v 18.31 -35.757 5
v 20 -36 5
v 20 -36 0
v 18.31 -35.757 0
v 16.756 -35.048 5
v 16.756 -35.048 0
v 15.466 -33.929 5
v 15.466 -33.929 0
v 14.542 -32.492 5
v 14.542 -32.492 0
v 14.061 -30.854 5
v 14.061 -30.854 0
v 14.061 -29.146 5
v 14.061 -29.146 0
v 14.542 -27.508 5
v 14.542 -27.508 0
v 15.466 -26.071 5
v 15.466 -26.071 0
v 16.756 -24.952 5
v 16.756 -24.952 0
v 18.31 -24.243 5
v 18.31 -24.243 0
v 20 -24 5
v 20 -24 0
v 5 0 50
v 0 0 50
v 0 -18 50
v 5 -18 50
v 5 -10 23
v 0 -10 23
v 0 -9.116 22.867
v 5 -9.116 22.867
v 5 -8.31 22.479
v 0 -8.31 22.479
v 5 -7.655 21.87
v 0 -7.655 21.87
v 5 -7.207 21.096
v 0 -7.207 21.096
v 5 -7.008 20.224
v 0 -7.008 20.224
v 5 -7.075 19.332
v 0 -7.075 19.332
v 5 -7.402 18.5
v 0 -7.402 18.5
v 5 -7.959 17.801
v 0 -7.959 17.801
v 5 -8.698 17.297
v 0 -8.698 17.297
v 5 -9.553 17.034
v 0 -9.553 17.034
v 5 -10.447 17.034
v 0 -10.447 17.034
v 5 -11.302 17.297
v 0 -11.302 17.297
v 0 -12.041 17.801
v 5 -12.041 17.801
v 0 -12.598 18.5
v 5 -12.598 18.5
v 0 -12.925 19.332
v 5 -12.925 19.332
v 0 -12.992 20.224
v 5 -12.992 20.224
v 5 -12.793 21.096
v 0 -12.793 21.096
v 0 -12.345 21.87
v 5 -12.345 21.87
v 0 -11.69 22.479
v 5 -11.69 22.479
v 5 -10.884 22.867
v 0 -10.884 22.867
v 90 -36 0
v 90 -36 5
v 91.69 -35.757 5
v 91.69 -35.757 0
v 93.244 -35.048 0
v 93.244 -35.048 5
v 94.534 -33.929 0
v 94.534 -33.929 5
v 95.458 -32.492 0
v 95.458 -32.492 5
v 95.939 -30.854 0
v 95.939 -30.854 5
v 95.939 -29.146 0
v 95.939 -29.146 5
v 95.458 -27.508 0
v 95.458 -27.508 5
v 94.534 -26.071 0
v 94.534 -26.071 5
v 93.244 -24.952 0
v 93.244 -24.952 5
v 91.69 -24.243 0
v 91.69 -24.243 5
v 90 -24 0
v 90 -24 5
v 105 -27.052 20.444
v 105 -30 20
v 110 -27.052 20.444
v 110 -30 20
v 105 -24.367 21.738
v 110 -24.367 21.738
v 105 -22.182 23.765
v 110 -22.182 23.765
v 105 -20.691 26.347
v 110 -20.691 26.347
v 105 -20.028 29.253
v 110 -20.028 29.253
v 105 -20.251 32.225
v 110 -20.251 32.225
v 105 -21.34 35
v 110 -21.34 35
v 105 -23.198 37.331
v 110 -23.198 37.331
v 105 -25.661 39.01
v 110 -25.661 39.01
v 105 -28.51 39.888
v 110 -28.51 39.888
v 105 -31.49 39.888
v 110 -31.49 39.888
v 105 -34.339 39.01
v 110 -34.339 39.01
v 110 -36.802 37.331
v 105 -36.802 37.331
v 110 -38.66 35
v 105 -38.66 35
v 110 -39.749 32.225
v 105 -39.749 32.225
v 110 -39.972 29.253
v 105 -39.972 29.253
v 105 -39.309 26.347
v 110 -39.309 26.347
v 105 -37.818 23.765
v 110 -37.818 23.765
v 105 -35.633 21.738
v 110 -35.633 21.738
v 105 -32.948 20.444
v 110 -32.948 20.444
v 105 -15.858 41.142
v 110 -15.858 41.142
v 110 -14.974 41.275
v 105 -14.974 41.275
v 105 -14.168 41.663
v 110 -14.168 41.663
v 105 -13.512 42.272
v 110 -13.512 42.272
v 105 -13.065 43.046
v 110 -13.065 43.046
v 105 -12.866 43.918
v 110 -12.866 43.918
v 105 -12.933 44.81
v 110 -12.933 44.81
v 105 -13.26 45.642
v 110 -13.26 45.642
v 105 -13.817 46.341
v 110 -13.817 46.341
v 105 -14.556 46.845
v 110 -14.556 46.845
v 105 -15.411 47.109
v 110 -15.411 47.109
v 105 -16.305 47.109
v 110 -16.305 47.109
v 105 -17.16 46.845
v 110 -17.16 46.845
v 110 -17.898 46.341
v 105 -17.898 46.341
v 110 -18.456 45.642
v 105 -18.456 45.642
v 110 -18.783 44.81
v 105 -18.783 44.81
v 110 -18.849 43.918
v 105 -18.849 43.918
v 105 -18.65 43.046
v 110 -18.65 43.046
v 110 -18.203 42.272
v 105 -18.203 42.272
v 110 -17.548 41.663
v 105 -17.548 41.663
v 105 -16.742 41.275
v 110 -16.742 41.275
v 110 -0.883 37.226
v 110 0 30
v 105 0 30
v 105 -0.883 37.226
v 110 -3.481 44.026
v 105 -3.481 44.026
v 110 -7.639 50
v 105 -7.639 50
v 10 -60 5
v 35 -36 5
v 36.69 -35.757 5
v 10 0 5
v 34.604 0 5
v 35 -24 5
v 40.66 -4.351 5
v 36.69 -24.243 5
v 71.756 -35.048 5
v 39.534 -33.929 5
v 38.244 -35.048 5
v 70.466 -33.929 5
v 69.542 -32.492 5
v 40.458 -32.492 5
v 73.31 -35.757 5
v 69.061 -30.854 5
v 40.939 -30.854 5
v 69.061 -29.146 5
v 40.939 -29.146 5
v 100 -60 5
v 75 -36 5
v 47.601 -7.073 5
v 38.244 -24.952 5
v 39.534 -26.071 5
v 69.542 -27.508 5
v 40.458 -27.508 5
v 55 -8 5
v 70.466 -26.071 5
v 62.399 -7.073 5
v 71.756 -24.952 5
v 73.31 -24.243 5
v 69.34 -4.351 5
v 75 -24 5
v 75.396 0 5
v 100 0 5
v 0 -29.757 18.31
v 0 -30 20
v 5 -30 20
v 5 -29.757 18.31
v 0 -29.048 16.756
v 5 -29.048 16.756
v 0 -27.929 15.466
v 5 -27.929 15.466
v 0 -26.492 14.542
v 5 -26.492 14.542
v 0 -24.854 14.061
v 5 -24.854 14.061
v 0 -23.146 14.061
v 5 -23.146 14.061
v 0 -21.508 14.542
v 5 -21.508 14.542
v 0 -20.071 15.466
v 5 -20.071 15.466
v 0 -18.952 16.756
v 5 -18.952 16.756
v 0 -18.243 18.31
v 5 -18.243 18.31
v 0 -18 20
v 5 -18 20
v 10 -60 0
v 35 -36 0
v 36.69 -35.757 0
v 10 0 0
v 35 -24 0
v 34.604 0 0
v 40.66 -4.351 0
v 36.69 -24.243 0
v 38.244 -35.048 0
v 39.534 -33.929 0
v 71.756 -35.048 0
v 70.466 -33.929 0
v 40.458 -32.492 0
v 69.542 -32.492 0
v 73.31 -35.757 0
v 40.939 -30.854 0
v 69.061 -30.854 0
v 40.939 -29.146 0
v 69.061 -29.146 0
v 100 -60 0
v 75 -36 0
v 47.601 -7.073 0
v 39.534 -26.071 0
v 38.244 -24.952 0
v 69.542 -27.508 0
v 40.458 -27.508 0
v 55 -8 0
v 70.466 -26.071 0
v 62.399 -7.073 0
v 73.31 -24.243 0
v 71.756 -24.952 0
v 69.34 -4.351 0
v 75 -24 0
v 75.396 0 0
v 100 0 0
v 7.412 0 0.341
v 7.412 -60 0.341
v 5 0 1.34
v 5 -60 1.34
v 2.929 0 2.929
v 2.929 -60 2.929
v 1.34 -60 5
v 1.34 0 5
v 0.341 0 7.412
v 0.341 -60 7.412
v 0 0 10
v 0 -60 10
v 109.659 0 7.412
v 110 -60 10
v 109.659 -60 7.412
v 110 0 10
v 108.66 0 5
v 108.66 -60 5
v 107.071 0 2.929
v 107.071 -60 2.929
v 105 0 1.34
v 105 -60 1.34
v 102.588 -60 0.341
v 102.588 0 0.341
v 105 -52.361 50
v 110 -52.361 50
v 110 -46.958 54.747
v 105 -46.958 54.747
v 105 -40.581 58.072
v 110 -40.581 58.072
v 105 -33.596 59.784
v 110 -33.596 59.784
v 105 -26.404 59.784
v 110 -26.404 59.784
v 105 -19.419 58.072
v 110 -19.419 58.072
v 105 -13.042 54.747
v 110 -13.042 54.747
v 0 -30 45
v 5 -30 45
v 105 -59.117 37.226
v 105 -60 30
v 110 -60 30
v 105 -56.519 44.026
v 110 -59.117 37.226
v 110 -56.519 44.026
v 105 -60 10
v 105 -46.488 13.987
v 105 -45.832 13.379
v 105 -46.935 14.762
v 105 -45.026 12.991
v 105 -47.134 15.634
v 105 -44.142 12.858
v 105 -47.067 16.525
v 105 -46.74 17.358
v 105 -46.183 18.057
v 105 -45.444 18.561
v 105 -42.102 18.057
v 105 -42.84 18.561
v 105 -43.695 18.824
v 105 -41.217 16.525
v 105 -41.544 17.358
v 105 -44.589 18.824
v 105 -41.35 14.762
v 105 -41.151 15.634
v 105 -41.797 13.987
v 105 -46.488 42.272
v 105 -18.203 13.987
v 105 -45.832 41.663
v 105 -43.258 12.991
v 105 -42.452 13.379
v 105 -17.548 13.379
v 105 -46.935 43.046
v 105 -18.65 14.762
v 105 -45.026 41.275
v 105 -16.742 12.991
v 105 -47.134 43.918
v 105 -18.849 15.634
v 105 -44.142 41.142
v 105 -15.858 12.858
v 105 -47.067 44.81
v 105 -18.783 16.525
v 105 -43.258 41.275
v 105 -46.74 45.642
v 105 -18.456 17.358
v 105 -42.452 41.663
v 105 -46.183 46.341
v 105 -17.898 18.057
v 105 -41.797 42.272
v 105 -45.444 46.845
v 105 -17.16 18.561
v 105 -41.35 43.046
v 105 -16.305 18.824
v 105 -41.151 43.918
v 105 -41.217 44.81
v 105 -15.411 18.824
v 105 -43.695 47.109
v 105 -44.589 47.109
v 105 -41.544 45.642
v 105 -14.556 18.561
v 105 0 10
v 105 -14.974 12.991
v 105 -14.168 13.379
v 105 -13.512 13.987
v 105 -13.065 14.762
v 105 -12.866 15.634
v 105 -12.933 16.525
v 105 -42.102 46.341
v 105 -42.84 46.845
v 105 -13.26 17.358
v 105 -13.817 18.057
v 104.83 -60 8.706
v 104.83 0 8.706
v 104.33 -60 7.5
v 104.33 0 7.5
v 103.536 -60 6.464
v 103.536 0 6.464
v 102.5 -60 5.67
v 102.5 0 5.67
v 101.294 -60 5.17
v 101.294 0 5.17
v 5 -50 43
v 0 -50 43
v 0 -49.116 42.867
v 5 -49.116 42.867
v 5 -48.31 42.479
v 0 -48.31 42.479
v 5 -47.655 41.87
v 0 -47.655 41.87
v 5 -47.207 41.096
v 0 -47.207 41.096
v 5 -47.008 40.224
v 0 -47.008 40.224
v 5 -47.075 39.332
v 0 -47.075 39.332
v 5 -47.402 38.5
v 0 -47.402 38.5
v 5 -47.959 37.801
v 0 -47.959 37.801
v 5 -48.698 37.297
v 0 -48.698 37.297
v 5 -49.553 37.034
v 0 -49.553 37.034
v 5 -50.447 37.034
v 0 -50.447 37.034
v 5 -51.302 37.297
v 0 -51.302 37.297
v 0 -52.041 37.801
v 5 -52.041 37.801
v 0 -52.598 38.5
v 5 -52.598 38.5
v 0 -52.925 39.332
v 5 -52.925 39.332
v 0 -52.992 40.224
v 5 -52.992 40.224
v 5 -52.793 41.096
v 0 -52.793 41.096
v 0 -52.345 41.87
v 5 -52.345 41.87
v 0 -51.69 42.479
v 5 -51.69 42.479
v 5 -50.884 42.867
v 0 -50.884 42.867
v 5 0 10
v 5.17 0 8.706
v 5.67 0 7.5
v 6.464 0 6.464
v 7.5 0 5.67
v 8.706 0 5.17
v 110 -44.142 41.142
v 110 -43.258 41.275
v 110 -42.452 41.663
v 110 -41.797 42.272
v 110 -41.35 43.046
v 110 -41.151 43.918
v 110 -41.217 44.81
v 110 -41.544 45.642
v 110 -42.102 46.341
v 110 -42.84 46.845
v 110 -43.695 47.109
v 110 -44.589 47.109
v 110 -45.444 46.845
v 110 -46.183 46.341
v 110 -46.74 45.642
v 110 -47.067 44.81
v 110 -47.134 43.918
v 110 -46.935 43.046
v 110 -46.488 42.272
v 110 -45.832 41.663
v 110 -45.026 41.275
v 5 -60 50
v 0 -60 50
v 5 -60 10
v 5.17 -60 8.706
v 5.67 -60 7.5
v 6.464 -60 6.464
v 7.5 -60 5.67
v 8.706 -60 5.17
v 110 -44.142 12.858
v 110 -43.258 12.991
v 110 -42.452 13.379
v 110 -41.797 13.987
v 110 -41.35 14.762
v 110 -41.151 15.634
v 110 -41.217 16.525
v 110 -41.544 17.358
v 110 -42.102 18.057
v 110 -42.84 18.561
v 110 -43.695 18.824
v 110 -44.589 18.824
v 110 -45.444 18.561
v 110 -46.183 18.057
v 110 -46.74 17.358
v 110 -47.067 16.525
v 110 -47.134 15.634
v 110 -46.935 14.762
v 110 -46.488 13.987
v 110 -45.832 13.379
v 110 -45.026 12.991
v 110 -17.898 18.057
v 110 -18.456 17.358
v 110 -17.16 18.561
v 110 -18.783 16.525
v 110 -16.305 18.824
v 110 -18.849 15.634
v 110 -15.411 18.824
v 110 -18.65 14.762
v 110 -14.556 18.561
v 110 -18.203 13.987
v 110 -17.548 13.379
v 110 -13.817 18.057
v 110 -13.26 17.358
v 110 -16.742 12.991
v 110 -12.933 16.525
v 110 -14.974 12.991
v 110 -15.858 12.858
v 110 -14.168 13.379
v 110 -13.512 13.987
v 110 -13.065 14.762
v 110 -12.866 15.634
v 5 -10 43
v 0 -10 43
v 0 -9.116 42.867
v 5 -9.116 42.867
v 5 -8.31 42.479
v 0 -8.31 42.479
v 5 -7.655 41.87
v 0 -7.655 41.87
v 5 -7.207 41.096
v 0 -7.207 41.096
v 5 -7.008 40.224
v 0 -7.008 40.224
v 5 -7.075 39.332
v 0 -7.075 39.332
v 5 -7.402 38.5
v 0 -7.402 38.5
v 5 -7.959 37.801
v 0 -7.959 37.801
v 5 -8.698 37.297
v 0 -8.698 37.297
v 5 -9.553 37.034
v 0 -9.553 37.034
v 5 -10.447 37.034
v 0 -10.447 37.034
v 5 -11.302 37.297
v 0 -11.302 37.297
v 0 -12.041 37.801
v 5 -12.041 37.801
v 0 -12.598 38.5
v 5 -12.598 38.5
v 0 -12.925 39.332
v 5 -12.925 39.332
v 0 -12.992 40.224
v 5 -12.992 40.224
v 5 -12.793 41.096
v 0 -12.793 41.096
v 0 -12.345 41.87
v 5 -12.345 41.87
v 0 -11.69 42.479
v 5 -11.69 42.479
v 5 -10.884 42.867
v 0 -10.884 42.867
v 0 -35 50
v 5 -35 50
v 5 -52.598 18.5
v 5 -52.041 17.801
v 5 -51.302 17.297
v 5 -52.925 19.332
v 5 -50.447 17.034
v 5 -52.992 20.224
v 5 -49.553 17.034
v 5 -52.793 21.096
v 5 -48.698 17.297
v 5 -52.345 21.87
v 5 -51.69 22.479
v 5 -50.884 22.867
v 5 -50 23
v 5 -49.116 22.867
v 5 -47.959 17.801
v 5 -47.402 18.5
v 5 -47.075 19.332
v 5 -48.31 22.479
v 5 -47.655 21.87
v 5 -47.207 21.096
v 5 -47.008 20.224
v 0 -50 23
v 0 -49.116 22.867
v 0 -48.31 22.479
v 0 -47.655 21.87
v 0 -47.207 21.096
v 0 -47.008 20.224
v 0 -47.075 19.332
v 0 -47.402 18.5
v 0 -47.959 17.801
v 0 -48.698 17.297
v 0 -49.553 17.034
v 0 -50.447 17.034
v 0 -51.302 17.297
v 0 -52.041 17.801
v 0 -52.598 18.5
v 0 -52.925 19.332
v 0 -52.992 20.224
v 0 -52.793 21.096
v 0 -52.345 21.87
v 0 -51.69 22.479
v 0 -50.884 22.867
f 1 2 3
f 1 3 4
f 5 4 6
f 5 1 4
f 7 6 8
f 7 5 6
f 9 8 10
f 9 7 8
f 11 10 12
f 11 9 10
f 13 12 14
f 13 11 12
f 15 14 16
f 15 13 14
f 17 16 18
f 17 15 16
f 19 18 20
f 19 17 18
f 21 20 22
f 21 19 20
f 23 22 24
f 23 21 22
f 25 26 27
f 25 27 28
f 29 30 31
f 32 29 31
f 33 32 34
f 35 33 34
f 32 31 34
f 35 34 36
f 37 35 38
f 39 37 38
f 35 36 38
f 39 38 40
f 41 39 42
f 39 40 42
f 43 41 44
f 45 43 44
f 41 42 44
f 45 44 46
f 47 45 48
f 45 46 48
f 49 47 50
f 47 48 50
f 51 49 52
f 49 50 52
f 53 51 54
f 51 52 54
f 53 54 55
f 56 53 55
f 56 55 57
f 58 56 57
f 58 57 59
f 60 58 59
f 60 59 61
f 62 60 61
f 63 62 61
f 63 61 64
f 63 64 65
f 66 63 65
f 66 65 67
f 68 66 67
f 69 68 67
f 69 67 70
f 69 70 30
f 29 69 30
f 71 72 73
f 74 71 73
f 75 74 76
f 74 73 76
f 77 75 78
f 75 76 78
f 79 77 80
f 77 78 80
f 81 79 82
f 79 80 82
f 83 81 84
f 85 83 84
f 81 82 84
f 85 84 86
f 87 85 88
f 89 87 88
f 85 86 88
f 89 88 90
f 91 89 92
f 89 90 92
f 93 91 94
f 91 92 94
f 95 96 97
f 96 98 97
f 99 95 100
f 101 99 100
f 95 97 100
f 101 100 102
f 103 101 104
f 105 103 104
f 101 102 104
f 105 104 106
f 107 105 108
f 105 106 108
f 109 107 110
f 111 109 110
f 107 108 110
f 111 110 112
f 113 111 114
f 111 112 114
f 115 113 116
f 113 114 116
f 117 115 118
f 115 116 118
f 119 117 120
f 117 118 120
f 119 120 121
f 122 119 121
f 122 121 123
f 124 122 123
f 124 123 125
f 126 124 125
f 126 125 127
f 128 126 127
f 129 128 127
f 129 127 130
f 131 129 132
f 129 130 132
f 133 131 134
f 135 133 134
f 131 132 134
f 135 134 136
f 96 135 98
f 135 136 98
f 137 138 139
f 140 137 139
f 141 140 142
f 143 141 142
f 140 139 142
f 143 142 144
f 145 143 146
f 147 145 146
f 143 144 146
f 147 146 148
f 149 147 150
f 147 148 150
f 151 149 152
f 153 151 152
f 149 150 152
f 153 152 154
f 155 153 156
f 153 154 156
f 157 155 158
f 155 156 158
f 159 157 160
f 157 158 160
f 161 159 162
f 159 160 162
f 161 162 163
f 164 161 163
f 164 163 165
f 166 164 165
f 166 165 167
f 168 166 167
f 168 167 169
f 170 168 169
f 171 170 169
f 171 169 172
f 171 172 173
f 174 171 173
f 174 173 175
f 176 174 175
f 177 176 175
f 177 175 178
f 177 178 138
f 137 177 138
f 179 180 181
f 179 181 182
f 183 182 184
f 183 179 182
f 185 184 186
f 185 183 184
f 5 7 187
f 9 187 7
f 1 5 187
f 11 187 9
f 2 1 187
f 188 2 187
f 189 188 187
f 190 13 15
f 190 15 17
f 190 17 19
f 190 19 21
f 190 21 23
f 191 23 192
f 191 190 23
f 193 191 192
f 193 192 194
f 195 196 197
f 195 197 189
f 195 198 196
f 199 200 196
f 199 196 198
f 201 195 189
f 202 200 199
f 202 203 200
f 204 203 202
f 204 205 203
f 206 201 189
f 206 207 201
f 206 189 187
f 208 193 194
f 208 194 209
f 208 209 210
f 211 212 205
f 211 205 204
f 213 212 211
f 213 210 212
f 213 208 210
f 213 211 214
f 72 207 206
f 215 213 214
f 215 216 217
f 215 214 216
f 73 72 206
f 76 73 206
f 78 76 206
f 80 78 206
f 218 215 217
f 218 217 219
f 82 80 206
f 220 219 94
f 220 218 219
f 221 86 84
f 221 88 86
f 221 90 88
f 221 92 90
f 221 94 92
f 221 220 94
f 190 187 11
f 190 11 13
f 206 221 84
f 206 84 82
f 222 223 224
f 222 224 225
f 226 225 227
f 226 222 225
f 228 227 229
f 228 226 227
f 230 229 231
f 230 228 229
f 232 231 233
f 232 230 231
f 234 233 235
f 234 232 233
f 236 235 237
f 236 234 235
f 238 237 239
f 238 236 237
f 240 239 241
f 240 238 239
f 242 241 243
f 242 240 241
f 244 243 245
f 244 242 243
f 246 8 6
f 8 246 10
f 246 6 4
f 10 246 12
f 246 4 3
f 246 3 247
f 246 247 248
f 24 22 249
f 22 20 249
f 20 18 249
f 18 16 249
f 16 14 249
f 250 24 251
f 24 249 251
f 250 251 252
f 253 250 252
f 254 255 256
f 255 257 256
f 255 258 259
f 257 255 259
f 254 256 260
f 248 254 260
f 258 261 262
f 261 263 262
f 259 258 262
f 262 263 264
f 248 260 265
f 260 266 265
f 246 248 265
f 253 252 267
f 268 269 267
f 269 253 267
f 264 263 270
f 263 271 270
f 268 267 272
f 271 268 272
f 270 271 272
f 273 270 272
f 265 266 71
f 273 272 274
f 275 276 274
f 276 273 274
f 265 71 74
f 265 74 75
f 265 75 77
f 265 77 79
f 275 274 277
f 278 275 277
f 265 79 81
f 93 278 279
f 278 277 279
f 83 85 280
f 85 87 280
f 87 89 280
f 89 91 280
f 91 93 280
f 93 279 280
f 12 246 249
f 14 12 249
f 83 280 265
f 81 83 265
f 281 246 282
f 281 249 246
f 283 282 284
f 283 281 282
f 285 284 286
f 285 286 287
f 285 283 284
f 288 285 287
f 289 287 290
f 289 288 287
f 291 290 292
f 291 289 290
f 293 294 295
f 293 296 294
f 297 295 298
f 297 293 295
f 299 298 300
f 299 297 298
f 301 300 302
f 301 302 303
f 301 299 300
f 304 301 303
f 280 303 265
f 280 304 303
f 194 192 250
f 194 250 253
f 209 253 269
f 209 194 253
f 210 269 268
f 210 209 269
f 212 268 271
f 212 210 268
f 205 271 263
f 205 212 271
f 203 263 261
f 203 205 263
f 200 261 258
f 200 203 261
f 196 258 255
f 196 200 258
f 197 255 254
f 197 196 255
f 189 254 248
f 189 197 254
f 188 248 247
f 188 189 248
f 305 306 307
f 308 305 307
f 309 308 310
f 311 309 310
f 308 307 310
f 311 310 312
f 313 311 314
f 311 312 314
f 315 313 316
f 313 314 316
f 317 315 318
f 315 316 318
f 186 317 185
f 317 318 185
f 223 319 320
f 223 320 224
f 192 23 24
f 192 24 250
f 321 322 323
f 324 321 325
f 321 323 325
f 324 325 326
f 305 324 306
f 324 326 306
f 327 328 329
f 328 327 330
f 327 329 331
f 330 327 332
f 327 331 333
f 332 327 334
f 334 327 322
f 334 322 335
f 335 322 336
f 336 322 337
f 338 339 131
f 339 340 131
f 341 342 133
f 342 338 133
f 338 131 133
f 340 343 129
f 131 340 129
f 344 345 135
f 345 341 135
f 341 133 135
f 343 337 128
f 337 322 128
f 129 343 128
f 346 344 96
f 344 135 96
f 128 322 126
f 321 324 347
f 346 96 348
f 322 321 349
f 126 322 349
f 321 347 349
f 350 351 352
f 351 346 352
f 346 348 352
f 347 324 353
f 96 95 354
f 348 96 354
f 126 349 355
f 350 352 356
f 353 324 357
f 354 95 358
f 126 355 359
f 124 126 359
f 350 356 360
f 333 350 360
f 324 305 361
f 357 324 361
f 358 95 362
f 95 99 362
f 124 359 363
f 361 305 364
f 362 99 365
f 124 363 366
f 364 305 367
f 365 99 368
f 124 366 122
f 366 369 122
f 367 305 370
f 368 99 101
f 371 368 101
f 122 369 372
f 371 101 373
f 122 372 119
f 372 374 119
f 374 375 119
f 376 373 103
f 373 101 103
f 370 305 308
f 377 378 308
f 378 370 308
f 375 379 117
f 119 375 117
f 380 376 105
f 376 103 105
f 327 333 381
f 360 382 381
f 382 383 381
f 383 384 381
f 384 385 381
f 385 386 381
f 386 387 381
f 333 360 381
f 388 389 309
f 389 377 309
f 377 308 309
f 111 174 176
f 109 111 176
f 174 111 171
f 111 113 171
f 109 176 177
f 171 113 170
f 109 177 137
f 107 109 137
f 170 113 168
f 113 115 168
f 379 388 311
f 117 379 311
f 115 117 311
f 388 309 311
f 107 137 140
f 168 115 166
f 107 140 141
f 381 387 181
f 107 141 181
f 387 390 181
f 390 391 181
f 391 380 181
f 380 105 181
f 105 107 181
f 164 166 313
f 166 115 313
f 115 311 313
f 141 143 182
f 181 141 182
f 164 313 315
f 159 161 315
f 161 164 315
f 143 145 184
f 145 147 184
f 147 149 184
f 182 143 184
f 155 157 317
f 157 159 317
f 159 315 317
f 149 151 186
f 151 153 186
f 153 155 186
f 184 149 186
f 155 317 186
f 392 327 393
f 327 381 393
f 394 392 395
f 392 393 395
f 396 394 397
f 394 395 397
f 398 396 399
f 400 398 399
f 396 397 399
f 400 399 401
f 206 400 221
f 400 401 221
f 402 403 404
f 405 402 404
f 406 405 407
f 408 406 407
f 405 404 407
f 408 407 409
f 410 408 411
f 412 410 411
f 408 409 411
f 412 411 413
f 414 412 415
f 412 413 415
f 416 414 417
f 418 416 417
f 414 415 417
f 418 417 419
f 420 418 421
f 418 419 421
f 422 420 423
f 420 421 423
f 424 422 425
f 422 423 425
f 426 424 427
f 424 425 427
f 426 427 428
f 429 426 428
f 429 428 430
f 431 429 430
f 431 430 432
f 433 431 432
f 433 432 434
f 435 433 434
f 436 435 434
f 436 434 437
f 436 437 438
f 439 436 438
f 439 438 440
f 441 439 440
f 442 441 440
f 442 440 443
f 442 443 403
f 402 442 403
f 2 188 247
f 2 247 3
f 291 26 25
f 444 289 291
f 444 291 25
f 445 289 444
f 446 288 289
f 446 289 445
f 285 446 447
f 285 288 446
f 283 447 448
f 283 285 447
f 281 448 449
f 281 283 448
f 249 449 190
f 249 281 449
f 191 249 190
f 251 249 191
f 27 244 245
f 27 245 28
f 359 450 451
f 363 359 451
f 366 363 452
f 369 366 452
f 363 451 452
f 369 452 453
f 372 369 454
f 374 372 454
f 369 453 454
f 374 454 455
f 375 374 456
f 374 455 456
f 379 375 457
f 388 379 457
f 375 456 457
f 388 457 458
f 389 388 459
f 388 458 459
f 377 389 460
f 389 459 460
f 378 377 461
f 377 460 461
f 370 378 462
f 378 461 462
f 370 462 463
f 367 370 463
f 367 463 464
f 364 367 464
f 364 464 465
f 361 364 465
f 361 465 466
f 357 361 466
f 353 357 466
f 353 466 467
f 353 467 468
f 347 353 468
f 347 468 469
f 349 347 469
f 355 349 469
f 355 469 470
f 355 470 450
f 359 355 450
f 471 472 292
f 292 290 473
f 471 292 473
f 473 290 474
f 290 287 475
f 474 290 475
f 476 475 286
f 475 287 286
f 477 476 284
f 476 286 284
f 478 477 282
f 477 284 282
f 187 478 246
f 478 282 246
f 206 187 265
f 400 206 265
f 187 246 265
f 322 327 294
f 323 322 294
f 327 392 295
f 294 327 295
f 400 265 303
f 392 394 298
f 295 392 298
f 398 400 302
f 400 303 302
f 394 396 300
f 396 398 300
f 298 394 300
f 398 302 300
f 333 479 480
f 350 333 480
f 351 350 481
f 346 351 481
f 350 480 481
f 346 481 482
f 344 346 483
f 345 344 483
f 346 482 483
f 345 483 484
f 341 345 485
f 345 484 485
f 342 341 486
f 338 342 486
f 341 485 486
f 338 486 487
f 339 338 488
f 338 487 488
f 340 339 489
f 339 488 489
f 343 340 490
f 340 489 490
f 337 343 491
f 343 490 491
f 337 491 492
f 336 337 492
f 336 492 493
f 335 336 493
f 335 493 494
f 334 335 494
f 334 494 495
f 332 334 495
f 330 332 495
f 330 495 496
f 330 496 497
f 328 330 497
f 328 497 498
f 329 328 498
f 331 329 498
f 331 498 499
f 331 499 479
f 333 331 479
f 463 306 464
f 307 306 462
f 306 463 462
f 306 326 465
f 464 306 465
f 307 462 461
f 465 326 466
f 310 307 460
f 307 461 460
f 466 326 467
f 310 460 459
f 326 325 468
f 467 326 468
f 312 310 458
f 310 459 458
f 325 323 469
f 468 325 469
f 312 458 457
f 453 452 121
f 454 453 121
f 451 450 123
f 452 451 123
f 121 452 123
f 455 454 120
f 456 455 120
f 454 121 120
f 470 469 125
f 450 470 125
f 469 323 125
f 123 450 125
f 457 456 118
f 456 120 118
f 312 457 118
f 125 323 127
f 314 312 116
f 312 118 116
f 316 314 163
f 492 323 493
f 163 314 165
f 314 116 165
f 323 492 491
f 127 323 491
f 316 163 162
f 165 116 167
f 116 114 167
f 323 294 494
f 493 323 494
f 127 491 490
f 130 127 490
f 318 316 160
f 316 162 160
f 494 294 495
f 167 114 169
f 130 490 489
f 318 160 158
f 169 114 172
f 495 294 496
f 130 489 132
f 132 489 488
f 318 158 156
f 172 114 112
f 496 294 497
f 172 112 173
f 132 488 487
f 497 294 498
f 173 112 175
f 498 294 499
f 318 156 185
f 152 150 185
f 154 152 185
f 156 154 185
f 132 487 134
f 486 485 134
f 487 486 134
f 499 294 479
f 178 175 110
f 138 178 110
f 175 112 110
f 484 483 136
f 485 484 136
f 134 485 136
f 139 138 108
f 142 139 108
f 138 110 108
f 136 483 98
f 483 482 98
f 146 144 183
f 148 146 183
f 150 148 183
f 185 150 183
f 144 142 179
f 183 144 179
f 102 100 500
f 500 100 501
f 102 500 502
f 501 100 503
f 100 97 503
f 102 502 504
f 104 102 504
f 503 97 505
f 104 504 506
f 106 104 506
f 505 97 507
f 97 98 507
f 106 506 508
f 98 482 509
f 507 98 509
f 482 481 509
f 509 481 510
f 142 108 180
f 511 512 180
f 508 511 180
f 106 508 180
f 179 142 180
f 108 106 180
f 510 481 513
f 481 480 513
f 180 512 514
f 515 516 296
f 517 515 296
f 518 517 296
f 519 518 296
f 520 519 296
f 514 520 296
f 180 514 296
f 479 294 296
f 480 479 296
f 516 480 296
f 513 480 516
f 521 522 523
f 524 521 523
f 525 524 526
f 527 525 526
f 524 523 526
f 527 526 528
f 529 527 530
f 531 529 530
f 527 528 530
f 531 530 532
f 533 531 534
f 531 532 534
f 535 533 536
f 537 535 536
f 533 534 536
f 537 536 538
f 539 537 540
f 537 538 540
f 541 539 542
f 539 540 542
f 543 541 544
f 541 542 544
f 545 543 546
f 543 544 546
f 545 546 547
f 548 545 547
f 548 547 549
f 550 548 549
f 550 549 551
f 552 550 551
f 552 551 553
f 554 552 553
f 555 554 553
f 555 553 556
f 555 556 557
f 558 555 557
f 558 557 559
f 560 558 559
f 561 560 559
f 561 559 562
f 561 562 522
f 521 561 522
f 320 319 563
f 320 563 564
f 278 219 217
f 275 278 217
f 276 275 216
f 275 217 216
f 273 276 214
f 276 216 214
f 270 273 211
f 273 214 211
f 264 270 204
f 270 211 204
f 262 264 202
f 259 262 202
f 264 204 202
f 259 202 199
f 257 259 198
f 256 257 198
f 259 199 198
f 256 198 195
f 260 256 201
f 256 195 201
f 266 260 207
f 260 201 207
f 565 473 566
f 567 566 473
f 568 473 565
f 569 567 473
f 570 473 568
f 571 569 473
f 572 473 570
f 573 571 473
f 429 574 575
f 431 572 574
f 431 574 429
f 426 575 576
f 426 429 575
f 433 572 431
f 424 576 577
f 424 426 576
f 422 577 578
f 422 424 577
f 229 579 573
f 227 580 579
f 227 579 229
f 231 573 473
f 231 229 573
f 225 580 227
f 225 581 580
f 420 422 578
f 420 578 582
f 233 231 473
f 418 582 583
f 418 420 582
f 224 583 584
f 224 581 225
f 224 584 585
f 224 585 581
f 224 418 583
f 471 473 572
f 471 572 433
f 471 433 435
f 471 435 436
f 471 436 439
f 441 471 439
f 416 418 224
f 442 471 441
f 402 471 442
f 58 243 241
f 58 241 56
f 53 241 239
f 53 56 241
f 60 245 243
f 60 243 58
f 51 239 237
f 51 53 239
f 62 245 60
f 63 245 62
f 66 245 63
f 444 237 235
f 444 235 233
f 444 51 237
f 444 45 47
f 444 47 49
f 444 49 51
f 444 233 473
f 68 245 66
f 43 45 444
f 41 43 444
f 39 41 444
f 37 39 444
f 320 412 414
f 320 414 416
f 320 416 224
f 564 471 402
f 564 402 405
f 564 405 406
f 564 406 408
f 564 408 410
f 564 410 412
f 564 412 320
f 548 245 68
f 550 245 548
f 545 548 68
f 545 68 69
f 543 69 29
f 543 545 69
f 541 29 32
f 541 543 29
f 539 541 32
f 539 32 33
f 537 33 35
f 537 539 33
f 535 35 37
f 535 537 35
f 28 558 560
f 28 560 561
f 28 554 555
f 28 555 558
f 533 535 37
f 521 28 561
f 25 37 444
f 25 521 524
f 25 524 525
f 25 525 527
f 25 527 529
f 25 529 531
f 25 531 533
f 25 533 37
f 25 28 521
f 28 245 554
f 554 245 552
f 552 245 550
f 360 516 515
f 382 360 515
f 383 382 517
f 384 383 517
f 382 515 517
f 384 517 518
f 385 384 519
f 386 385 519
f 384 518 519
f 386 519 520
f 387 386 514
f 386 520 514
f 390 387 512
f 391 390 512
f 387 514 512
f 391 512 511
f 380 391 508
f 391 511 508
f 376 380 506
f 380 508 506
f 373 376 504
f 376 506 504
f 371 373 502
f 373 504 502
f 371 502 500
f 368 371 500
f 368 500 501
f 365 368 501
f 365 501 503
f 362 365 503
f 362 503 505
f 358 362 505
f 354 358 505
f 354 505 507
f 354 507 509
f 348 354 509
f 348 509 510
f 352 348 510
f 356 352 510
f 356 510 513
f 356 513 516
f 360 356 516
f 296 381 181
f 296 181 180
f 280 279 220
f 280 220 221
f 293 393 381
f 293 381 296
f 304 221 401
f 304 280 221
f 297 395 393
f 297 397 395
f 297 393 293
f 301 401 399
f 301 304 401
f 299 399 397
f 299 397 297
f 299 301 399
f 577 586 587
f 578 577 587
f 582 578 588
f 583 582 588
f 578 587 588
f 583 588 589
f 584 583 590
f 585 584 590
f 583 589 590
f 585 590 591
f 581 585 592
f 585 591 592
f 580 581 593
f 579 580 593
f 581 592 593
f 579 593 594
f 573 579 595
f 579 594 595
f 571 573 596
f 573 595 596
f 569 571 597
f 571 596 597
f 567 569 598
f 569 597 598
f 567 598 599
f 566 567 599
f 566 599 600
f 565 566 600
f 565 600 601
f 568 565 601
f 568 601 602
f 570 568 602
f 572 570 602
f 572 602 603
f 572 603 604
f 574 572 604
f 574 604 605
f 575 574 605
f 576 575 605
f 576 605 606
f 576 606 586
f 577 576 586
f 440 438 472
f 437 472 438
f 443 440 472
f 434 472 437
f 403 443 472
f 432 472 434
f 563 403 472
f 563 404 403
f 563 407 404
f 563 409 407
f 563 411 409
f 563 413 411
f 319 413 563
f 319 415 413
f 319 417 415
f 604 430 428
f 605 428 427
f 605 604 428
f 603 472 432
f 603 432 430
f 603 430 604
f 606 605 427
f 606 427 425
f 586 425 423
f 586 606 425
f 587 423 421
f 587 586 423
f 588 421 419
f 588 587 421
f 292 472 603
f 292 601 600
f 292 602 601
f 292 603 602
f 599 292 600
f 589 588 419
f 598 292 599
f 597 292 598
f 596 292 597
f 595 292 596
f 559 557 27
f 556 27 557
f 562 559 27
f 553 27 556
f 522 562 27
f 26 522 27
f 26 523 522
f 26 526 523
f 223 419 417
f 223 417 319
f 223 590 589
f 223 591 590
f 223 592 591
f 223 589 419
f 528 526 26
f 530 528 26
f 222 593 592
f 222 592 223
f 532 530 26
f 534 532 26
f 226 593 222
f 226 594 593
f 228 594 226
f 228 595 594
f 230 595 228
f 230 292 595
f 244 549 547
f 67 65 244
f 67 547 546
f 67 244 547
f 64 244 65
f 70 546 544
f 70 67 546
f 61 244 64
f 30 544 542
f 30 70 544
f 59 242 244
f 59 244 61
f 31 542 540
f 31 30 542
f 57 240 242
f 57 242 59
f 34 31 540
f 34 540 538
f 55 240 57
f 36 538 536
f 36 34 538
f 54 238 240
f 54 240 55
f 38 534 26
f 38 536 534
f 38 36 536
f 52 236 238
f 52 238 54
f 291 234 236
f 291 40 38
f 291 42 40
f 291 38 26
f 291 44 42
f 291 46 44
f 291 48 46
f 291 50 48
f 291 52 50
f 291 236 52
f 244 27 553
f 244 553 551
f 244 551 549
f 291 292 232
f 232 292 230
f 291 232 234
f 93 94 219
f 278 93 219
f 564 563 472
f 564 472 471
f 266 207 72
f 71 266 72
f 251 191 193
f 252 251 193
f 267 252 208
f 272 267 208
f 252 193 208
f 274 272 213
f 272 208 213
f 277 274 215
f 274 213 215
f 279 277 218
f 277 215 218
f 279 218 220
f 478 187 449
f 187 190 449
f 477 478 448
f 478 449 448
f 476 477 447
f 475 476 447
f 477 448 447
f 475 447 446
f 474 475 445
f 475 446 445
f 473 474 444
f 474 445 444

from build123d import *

# Parameters (mm, degrees)
SKETCH1_W           = 110
SKETCH1_H           = 60
BOSS_EXTRUDE1_DEPTH = 50
SKETCH2_W           = 100
SKETCH2_H           = 60
CUT_EXTRUDE1_DEPTH  = 45
FILLET1_R           = 5
FILLET2_R           = 10
SKETCH3_R           = 30
CUT_EXTRUDE2_DEPTH  = 6
CUT_EXTRUDE3_DEPTH  = 6
CUT_EXTRUDE4_REACH  = 112
CUT_EXTRUDE5_REACH  = 112
SKETCH6_R           = 3
BOSS_EXTRUDE2_DEPTH = 5
CUT_EXTRUDE6_REACH  = 112
CUT_EXTRUDE9_REACH  = 112
SKETCH10_R          = 10
SKETCH10_R_2        = 3
CHAMFER1_SIZE       = 5


with BuildPart() as part:
    # Sketch1 → Boss-Extrude1 (new body)
    with BuildSketch(Plane.XY):
        with Locations((55, -30)):
            Rectangle(SKETCH1_W, SKETCH1_H)
    extrude(amount=BOSS_EXTRUDE1_DEPTH)

    # Sketch2 → Cut-Extrude1 (cut)
    with BuildSketch(Plane.XY.offset(50)):
        with Locations((55, -30)):
            Rectangle(SKETCH2_W, SKETCH2_H)
    extrude(amount=-CUT_EXTRUDE1_DEPTH, mode=Mode.SUBTRACT)

    # Fillet1
    fillet1_edges = [part.edges().sort_by_distance(p)[0] for p in [
        (5, -30, 5),
        (105, -30, 5),
    ]]
    fillet(fillet1_edges, radius=FILLET1_R)

    # Fillet2
    fillet2_edges = [part.edges().sort_by_distance(p)[0] for p in [
        (110, -30, 0),
        (0, -30, 0),
    ]]
    fillet(fillet2_edges, radius=FILLET2_R)

    # Sketch3 → Cut-Extrude2 (cut, through all)
    with BuildSketch(Plane.XY.offset(5)):
        with Locations((55, 22)):
            Circle(SKETCH3_R)
    extrude(amount=-CUT_EXTRUDE2_DEPTH, mode=Mode.SUBTRACT)

    # Sketch4 → Cut-Extrude3 (cut, through all)
    with BuildSketch(Plane.XY.offset(5)):
        with BuildLine():
            Line((20, -24), (35, -24))
            ThreePointArc((35, -24), (41, -30), (35, -36))
            Line((35, -36), (20, -36))
            ThreePointArc((20, -36), (14, -30), (20, -24))
        make_face()
        with BuildLine():
            Line((90, -24), (75, -24))
            ThreePointArc((75, -24), (69, -30), (75, -36))
            Line((75, -36), (90, -36))
            ThreePointArc((90, -36), (96, -30), (90, -24))
        make_face()
    extrude(amount=-CUT_EXTRUDE3_DEPTH, mode=Mode.SUBTRACT)

    # Sketch5 → Cut-Extrude4 (cut, up to next)
    with BuildSketch(Plane.ZY, mode=Mode.PRIVATE) as cut_extrude4_sk1:
        with BuildLine():
            Line((60, -30), (20, -30))
            ThreePointArc((20, -30), (14, -24), (20, -18))
            Line((20, -18), (60, -18))
            ThreePointArc((60, -18), (66, -24), (60, -30))
        make_face()
    cut_extrude4_tool1 = extrude(cut_extrude4_sk1.sketch, amount=-CUT_EXTRUDE4_REACH, mode=Mode.PRIVATE) & part.part
    add(cut_extrude4_tool1.solids().sort_by_distance((0, -24, 40))[0], mode=Mode.SUBTRACT)

    # Sketch6 → Cut-Extrude5 (cut, up to next)
    with BuildSketch(Plane.ZY, mode=Mode.PRIVATE) as cut_extrude5_sk1:
        with Locations((20, -10)):
            Circle(SKETCH6_R)
    cut_extrude5_tool1 = extrude(cut_extrude5_sk1.sketch, amount=-CUT_EXTRUDE5_REACH, mode=Mode.PRIVATE) & part.part
    add(cut_extrude5_tool1.solids().sort_by_distance((0, -10, 20))[0], mode=Mode.SUBTRACT)
    # Sketch6 → Cut-Extrude5 (cut, up to next)
    with BuildSketch(Plane.ZY, mode=Mode.PRIVATE) as cut_extrude5_sk2:
        with Locations((40, -10)):
            Circle(SKETCH6_R)
    cut_extrude5_tool2 = extrude(cut_extrude5_sk2.sketch, amount=-CUT_EXTRUDE5_REACH, mode=Mode.PRIVATE) & part.part
    add(cut_extrude5_tool2.solids().sort_by_distance((0, -10, 40))[0], mode=Mode.SUBTRACT)
    # Sketch6 → Cut-Extrude5 (cut, up to next)
    with BuildSketch(Plane.ZY, mode=Mode.PRIVATE) as cut_extrude5_sk3:
        with Locations((40, -50)):
            Circle(SKETCH6_R)
    cut_extrude5_tool3 = extrude(cut_extrude5_sk3.sketch, amount=-CUT_EXTRUDE5_REACH, mode=Mode.PRIVATE) & part.part
    add(cut_extrude5_tool3.solids().sort_by_distance((0, -50, 40))[0], mode=Mode.SUBTRACT)
    # Sketch6 → Cut-Extrude5 (cut, up to next)
    with BuildSketch(Plane.ZY, mode=Mode.PRIVATE) as cut_extrude5_sk4:
        with Locations((20, -50)):
            Circle(SKETCH6_R)
    cut_extrude5_tool4 = extrude(cut_extrude5_sk4.sketch, amount=-CUT_EXTRUDE5_REACH, mode=Mode.PRIVATE) & part.part
    add(cut_extrude5_tool4.solids().sort_by_distance((0, -50, 20))[0], mode=Mode.SUBTRACT)

    # Sketch8 → Boss-Extrude2 (add)
    with BuildSketch(Plane(origin=(110, 0, 0), x_dir=(0, 0, -1), z_dir=(1, 0, 0))):
        with BuildLine():
            Line((-10, -7.639320225), (-10, -52.360679775))
            ThreePointArc((-10, -52.360679775), (-60, -30), (-10, -7.639320225))
        make_face()
    extrude(amount=-BOSS_EXTRUDE2_DEPTH)

    # Sketch9 → Cut-Extrude6 (cut, up to next)
    with BuildSketch(Plane(origin=(110, 0, 0), x_dir=(0, 0, -1), z_dir=(1, 0, 0)), mode=Mode.PRIVATE) as cut_extrude6_sk1:
        with BuildLine():
            Line((-50, -7.639320225), (-50, 0))
            Line((-50, 0), (-30, 0))
            ThreePointArc((-30, 0), (-40.704662693, -1.974829231), (-50, -7.639320225))
        make_face()
    cut_extrude6_tool1 = extrude(cut_extrude6_sk1.sketch, amount=-CUT_EXTRUDE6_REACH, mode=Mode.PRIVATE) & part.part
    add(cut_extrude6_tool1.solids().sort_by_distance((110, -2.231338, 45.13628))[0], mode=Mode.SUBTRACT)
    # Sketch9 → Cut-Extrude6 (cut, up to next)
    with BuildSketch(Plane(origin=(110, 0, 0), x_dir=(0, 0, -1), z_dir=(1, 0, 0)), mode=Mode.PRIVATE) as cut_extrude6_sk2:
        with BuildLine():
            Line((-50, -60), (-30, -60))
            ThreePointArc((-30, -60), (-40.704662693, -58.025170769), (-50, -52.360679775))
            Line((-50, -52.360679775), (-50, -60))
        make_face()
    cut_extrude6_tool2 = extrude(cut_extrude6_sk2.sketch, amount=-CUT_EXTRUDE6_REACH, mode=Mode.PRIVATE) & part.part
    add(cut_extrude6_tool2.solids().sort_by_distance((110, -57.768662, 45.13628))[0], mode=Mode.SUBTRACT)

    # Sketch10 → Cut-Extrude9 (cut, up to next)
    with BuildSketch(Plane(origin=(110, 0, 0), x_dir=(0, 0, -1), z_dir=(1, 0, 0)), mode=Mode.PRIVATE) as cut_extrude9_sk1:
        with Locations((-30, -30)):
            Circle(SKETCH10_R)
    cut_extrude9_tool1 = extrude(cut_extrude9_sk1.sketch, amount=-CUT_EXTRUDE9_REACH, mode=Mode.PRIVATE) & part.part
    add(cut_extrude9_tool1.solids().sort_by_distance((110, -30, 30))[0], mode=Mode.SUBTRACT)
    # Sketch10 → Cut-Extrude9 (cut, up to next)
    with BuildSketch(Plane(origin=(110, 0, 0), x_dir=(0, 0, -1), z_dir=(1, 0, 0)), mode=Mode.PRIVATE) as cut_extrude9_sk2:
        with Locations((-44.142135624, -15.857864376)):
            Circle(SKETCH10_R_2)
    cut_extrude9_tool2 = extrude(cut_extrude9_sk2.sketch, amount=-CUT_EXTRUDE9_REACH, mode=Mode.PRIVATE) & part.part
    add(cut_extrude9_tool2.solids().sort_by_distance((110, -15.857864, 44.142136))[0], mode=Mode.SUBTRACT)
    # Sketch10 → Cut-Extrude9 (cut, up to next)
    with BuildSketch(Plane(origin=(110, 0, 0), x_dir=(0, 0, -1), z_dir=(1, 0, 0)), mode=Mode.PRIVATE) as cut_extrude9_sk3:
        with Locations((-15.857864376, -15.857864376)):
            Circle(SKETCH10_R_2)
    cut_extrude9_tool3 = extrude(cut_extrude9_sk3.sketch, amount=-CUT_EXTRUDE9_REACH, mode=Mode.PRIVATE) & part.part
    add(cut_extrude9_tool3.solids().sort_by_distance((110, -15.857864, 15.857864))[0], mode=Mode.SUBTRACT)
    # Sketch10 → Cut-Extrude9 (cut, up to next)
    with BuildSketch(Plane(origin=(110, 0, 0), x_dir=(0, 0, -1), z_dir=(1, 0, 0)), mode=Mode.PRIVATE) as cut_extrude9_sk4:
        with Locations((-15.857864376, -44.142135624)):
            Circle(SKETCH10_R_2)
    cut_extrude9_tool4 = extrude(cut_extrude9_sk4.sketch, amount=-CUT_EXTRUDE9_REACH, mode=Mode.PRIVATE) & part.part
    add(cut_extrude9_tool4.solids().sort_by_distance((110, -44.142136, 15.857864))[0], mode=Mode.SUBTRACT)
    # Sketch10 → Cut-Extrude9 (cut, up to next)
    with BuildSketch(Plane(origin=(110, 0, 0), x_dir=(0, 0, -1), z_dir=(1, 0, 0)), mode=Mode.PRIVATE) as cut_extrude9_sk5:
        with Locations((-44.142135624, -44.142135624)):
            Circle(SKETCH10_R_2)
    cut_extrude9_tool5 = extrude(cut_extrude9_sk5.sketch, amount=-CUT_EXTRUDE9_REACH, mode=Mode.PRIVATE) & part.part
    add(cut_extrude9_tool5.solids().sort_by_distance((110, -44.142136, 44.142136))[0], mode=Mode.SUBTRACT)

    # Chamfer1
    chamfer1_edges = [part.edges().sort_by_distance(p)[0] for p in [
        (2.5, -30, 50),
    ]]
    chamfer(chamfer1_edges, length=CHAMFER1_SIZE)


solid = part.part
